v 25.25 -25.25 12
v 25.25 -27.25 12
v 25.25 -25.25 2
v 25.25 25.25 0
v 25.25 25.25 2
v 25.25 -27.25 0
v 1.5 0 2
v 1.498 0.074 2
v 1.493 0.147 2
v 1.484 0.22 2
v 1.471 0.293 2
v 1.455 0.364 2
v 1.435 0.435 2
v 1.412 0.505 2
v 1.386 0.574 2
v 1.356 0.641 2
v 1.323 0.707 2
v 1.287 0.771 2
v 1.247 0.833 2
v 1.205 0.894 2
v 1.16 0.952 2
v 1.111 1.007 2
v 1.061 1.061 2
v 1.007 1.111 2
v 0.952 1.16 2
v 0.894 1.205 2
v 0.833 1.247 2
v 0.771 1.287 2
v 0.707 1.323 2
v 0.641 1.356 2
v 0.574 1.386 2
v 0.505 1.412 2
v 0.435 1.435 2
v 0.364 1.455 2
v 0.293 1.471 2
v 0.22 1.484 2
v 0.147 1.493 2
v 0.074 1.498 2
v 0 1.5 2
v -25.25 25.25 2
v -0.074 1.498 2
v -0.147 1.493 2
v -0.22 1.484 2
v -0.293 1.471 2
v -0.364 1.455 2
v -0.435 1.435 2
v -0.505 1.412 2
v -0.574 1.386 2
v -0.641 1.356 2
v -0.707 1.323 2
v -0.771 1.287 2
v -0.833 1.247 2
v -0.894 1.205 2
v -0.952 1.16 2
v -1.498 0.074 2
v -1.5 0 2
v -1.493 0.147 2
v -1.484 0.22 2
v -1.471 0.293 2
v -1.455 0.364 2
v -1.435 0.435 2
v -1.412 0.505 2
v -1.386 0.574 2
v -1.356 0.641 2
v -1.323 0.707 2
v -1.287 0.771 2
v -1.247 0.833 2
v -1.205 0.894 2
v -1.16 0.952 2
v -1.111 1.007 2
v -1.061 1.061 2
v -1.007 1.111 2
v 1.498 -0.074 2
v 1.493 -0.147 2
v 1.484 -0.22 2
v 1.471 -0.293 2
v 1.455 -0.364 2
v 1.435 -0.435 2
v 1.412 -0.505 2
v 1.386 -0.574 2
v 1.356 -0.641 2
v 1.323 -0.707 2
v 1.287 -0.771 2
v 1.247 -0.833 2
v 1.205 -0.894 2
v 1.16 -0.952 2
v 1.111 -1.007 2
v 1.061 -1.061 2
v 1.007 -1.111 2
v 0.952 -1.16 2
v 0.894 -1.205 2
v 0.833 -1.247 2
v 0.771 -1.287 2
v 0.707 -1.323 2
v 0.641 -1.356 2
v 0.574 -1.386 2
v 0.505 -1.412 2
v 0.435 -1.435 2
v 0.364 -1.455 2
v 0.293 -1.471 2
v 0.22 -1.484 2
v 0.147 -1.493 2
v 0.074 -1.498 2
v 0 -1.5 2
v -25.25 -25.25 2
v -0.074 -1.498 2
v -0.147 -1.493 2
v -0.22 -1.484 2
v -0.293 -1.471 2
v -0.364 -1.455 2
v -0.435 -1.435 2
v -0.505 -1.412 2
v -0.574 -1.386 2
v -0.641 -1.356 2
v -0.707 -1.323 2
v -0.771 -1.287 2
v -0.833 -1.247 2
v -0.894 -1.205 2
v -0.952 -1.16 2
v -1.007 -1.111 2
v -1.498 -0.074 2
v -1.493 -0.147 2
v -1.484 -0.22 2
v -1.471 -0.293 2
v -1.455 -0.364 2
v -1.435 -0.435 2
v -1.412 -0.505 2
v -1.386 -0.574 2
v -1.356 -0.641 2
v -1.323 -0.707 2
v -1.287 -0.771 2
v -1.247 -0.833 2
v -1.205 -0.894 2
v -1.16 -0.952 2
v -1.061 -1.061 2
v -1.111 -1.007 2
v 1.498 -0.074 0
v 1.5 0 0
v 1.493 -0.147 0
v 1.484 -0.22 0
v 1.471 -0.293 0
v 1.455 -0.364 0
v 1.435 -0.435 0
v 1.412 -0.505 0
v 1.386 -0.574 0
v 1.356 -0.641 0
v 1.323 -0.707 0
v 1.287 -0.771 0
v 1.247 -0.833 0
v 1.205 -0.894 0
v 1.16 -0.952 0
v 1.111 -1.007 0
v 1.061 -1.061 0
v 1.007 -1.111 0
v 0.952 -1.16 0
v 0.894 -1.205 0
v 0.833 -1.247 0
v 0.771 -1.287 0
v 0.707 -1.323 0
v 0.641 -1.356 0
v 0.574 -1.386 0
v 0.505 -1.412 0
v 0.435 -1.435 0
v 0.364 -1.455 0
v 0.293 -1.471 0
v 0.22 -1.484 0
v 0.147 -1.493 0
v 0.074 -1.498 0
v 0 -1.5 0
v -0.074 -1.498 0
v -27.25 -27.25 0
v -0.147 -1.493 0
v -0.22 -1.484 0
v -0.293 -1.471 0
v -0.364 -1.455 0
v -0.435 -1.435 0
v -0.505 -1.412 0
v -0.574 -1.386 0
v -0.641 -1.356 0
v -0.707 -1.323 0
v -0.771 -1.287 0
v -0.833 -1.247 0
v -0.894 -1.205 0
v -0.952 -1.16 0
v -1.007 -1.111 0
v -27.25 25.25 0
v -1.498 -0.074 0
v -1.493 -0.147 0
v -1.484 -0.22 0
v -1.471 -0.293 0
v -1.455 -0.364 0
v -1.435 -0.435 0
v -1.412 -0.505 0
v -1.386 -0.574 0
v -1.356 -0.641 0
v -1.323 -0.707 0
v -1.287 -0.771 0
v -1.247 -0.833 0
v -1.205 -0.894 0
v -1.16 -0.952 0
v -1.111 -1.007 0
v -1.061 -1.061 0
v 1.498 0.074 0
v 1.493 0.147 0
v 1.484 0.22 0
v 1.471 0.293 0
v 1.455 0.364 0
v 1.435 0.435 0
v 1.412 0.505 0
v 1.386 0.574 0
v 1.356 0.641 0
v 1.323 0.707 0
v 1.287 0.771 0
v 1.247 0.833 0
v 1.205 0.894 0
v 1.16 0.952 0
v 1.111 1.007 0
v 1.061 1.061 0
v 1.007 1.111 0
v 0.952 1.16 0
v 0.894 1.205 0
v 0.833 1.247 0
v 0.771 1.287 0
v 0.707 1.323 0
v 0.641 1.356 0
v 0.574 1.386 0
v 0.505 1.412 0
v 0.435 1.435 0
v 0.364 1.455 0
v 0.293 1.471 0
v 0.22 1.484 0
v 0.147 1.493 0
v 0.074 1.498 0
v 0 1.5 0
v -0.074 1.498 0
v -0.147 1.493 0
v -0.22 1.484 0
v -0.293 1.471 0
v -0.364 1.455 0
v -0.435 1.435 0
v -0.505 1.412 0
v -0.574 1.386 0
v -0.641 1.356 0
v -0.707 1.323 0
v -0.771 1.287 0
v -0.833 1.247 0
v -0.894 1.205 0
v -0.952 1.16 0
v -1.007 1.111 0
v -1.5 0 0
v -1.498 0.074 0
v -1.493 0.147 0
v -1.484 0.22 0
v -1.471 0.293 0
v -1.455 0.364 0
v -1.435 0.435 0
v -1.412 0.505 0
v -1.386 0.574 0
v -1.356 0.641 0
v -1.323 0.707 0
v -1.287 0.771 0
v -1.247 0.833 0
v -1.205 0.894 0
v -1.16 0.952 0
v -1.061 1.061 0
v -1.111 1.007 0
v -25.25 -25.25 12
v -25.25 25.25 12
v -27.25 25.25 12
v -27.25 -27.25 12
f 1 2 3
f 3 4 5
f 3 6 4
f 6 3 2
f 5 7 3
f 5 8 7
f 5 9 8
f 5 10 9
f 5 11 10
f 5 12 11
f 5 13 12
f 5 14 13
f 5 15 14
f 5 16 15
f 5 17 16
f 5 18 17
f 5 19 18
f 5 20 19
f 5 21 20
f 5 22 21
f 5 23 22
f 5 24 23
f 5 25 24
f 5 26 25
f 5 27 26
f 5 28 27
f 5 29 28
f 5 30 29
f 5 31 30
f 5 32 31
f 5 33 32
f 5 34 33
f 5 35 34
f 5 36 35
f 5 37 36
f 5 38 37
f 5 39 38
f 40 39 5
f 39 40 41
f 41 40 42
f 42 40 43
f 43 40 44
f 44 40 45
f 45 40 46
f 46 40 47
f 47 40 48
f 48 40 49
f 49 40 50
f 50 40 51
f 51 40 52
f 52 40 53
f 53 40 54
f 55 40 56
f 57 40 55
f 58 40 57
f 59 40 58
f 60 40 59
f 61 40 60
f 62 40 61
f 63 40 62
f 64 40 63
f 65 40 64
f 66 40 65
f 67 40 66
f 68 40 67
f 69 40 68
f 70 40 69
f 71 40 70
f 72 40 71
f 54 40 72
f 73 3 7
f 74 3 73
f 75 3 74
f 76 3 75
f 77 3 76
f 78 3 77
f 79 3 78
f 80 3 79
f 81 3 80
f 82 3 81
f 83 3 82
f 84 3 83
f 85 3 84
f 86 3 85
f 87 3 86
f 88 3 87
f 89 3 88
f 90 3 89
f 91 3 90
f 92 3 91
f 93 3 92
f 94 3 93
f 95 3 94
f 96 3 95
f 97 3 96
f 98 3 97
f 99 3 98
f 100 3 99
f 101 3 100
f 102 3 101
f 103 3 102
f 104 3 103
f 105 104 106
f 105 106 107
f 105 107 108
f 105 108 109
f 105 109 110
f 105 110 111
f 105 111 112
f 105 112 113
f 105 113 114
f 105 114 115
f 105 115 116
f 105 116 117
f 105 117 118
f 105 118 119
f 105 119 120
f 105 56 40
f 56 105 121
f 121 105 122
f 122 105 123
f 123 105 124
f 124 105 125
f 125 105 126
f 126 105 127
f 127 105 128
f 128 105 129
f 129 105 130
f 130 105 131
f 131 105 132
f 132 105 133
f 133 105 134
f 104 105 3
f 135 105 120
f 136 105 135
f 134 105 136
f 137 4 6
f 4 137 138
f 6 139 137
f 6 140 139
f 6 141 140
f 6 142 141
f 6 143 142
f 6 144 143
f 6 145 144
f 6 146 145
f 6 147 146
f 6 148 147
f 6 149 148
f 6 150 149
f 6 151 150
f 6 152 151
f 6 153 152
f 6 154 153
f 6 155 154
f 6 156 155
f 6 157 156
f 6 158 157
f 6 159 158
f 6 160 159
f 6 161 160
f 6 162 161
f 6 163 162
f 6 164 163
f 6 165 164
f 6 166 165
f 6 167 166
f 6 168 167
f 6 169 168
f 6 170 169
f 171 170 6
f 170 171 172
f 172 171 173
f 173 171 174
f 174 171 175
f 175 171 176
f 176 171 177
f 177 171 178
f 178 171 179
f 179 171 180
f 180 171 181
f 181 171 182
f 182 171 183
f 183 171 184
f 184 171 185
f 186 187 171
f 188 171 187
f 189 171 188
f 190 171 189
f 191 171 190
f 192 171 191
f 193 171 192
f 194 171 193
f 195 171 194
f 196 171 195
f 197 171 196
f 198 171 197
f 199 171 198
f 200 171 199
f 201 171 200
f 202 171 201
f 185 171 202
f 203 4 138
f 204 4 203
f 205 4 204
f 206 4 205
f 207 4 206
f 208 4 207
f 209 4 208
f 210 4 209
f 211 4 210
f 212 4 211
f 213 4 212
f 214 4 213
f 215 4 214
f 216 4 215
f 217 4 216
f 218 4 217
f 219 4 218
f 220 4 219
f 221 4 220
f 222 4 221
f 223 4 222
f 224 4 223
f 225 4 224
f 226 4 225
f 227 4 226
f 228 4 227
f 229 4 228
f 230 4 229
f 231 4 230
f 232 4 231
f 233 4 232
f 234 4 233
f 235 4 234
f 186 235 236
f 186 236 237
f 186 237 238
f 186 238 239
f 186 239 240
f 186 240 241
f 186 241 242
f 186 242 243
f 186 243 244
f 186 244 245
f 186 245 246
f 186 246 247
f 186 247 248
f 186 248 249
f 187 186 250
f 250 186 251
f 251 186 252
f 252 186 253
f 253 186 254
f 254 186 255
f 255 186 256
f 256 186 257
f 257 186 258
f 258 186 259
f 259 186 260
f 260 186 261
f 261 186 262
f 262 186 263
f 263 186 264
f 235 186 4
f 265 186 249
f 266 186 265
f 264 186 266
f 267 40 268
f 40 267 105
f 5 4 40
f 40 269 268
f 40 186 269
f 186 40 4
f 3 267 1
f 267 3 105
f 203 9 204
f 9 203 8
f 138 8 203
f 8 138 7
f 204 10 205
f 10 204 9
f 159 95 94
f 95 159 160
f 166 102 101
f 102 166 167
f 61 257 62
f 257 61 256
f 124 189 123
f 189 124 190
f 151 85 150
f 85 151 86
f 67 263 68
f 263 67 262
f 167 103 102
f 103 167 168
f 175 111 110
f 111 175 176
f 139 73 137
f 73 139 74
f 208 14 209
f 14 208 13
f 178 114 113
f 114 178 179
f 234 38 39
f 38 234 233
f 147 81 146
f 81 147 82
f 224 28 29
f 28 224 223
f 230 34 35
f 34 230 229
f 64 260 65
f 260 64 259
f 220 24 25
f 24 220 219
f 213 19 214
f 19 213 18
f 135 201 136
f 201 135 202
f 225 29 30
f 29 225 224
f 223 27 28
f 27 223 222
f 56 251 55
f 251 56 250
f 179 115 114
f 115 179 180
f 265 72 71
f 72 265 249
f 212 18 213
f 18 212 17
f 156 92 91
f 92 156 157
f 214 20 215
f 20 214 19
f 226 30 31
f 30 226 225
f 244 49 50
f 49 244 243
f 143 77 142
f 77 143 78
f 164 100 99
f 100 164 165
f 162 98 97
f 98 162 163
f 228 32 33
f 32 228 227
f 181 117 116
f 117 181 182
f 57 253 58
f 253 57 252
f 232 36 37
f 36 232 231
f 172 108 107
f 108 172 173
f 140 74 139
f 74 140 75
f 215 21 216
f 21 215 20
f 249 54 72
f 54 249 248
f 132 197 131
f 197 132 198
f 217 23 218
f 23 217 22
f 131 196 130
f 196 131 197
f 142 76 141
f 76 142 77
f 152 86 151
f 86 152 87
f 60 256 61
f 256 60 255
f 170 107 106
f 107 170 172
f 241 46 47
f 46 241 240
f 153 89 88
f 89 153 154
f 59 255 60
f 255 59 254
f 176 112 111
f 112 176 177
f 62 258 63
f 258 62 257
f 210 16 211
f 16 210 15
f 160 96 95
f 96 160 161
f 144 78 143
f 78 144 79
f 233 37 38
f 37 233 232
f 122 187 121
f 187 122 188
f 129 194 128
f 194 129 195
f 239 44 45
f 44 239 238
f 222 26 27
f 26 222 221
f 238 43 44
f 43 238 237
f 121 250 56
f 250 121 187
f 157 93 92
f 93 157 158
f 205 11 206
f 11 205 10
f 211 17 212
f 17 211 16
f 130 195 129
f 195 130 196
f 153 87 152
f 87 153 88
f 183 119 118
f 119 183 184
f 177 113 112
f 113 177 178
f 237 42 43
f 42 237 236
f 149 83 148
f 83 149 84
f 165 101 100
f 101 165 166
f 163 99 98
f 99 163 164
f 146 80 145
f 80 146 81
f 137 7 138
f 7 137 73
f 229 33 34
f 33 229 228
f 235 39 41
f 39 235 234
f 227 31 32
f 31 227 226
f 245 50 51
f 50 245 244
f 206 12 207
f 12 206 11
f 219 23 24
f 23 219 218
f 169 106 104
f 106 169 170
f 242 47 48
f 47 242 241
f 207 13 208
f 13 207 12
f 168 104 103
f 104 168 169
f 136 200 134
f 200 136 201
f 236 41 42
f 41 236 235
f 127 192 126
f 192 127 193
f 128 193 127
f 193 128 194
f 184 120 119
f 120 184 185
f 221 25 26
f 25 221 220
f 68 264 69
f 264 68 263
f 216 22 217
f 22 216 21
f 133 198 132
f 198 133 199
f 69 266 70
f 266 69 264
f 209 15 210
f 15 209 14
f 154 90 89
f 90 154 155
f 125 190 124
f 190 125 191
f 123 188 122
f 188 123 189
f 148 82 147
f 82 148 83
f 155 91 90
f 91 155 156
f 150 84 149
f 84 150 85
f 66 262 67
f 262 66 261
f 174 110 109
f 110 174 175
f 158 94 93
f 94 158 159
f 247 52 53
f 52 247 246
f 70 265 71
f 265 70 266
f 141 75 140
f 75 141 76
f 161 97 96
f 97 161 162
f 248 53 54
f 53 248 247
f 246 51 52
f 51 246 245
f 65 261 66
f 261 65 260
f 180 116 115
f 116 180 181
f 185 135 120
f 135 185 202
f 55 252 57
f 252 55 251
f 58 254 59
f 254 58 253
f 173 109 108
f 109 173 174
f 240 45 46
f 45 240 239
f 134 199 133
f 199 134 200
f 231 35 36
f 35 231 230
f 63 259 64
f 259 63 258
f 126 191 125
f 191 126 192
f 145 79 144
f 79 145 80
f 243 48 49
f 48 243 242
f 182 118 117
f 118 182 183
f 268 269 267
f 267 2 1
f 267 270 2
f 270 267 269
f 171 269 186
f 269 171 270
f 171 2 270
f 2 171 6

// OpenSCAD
$fn=128+0;

// Diameter of pilot hole (mm)
pilot_hole_diameter=3;
// Square leg size (mm)
leg_size=50.5;
half_leg=leg_size/2;
// Thickness of jig (mm)
thick=2;
// Height of guide part (mm)
guide_height=12;

union() {
 
difference() {
translate([-half_leg,-half_leg,0]) cube([leg_size,leg_size,thick]);
translate([0,0,0]) cylinder(d=pilot_hole_diameter,h=thick*2.5,center=true);
}

translate([-half_leg-thick,-half_leg-thick,0]) cube([thick,leg_size+thick,guide_height]);
translate([-half_leg,-half_leg-thick,0]) cube([leg_size,thick,guide_height]);
}
